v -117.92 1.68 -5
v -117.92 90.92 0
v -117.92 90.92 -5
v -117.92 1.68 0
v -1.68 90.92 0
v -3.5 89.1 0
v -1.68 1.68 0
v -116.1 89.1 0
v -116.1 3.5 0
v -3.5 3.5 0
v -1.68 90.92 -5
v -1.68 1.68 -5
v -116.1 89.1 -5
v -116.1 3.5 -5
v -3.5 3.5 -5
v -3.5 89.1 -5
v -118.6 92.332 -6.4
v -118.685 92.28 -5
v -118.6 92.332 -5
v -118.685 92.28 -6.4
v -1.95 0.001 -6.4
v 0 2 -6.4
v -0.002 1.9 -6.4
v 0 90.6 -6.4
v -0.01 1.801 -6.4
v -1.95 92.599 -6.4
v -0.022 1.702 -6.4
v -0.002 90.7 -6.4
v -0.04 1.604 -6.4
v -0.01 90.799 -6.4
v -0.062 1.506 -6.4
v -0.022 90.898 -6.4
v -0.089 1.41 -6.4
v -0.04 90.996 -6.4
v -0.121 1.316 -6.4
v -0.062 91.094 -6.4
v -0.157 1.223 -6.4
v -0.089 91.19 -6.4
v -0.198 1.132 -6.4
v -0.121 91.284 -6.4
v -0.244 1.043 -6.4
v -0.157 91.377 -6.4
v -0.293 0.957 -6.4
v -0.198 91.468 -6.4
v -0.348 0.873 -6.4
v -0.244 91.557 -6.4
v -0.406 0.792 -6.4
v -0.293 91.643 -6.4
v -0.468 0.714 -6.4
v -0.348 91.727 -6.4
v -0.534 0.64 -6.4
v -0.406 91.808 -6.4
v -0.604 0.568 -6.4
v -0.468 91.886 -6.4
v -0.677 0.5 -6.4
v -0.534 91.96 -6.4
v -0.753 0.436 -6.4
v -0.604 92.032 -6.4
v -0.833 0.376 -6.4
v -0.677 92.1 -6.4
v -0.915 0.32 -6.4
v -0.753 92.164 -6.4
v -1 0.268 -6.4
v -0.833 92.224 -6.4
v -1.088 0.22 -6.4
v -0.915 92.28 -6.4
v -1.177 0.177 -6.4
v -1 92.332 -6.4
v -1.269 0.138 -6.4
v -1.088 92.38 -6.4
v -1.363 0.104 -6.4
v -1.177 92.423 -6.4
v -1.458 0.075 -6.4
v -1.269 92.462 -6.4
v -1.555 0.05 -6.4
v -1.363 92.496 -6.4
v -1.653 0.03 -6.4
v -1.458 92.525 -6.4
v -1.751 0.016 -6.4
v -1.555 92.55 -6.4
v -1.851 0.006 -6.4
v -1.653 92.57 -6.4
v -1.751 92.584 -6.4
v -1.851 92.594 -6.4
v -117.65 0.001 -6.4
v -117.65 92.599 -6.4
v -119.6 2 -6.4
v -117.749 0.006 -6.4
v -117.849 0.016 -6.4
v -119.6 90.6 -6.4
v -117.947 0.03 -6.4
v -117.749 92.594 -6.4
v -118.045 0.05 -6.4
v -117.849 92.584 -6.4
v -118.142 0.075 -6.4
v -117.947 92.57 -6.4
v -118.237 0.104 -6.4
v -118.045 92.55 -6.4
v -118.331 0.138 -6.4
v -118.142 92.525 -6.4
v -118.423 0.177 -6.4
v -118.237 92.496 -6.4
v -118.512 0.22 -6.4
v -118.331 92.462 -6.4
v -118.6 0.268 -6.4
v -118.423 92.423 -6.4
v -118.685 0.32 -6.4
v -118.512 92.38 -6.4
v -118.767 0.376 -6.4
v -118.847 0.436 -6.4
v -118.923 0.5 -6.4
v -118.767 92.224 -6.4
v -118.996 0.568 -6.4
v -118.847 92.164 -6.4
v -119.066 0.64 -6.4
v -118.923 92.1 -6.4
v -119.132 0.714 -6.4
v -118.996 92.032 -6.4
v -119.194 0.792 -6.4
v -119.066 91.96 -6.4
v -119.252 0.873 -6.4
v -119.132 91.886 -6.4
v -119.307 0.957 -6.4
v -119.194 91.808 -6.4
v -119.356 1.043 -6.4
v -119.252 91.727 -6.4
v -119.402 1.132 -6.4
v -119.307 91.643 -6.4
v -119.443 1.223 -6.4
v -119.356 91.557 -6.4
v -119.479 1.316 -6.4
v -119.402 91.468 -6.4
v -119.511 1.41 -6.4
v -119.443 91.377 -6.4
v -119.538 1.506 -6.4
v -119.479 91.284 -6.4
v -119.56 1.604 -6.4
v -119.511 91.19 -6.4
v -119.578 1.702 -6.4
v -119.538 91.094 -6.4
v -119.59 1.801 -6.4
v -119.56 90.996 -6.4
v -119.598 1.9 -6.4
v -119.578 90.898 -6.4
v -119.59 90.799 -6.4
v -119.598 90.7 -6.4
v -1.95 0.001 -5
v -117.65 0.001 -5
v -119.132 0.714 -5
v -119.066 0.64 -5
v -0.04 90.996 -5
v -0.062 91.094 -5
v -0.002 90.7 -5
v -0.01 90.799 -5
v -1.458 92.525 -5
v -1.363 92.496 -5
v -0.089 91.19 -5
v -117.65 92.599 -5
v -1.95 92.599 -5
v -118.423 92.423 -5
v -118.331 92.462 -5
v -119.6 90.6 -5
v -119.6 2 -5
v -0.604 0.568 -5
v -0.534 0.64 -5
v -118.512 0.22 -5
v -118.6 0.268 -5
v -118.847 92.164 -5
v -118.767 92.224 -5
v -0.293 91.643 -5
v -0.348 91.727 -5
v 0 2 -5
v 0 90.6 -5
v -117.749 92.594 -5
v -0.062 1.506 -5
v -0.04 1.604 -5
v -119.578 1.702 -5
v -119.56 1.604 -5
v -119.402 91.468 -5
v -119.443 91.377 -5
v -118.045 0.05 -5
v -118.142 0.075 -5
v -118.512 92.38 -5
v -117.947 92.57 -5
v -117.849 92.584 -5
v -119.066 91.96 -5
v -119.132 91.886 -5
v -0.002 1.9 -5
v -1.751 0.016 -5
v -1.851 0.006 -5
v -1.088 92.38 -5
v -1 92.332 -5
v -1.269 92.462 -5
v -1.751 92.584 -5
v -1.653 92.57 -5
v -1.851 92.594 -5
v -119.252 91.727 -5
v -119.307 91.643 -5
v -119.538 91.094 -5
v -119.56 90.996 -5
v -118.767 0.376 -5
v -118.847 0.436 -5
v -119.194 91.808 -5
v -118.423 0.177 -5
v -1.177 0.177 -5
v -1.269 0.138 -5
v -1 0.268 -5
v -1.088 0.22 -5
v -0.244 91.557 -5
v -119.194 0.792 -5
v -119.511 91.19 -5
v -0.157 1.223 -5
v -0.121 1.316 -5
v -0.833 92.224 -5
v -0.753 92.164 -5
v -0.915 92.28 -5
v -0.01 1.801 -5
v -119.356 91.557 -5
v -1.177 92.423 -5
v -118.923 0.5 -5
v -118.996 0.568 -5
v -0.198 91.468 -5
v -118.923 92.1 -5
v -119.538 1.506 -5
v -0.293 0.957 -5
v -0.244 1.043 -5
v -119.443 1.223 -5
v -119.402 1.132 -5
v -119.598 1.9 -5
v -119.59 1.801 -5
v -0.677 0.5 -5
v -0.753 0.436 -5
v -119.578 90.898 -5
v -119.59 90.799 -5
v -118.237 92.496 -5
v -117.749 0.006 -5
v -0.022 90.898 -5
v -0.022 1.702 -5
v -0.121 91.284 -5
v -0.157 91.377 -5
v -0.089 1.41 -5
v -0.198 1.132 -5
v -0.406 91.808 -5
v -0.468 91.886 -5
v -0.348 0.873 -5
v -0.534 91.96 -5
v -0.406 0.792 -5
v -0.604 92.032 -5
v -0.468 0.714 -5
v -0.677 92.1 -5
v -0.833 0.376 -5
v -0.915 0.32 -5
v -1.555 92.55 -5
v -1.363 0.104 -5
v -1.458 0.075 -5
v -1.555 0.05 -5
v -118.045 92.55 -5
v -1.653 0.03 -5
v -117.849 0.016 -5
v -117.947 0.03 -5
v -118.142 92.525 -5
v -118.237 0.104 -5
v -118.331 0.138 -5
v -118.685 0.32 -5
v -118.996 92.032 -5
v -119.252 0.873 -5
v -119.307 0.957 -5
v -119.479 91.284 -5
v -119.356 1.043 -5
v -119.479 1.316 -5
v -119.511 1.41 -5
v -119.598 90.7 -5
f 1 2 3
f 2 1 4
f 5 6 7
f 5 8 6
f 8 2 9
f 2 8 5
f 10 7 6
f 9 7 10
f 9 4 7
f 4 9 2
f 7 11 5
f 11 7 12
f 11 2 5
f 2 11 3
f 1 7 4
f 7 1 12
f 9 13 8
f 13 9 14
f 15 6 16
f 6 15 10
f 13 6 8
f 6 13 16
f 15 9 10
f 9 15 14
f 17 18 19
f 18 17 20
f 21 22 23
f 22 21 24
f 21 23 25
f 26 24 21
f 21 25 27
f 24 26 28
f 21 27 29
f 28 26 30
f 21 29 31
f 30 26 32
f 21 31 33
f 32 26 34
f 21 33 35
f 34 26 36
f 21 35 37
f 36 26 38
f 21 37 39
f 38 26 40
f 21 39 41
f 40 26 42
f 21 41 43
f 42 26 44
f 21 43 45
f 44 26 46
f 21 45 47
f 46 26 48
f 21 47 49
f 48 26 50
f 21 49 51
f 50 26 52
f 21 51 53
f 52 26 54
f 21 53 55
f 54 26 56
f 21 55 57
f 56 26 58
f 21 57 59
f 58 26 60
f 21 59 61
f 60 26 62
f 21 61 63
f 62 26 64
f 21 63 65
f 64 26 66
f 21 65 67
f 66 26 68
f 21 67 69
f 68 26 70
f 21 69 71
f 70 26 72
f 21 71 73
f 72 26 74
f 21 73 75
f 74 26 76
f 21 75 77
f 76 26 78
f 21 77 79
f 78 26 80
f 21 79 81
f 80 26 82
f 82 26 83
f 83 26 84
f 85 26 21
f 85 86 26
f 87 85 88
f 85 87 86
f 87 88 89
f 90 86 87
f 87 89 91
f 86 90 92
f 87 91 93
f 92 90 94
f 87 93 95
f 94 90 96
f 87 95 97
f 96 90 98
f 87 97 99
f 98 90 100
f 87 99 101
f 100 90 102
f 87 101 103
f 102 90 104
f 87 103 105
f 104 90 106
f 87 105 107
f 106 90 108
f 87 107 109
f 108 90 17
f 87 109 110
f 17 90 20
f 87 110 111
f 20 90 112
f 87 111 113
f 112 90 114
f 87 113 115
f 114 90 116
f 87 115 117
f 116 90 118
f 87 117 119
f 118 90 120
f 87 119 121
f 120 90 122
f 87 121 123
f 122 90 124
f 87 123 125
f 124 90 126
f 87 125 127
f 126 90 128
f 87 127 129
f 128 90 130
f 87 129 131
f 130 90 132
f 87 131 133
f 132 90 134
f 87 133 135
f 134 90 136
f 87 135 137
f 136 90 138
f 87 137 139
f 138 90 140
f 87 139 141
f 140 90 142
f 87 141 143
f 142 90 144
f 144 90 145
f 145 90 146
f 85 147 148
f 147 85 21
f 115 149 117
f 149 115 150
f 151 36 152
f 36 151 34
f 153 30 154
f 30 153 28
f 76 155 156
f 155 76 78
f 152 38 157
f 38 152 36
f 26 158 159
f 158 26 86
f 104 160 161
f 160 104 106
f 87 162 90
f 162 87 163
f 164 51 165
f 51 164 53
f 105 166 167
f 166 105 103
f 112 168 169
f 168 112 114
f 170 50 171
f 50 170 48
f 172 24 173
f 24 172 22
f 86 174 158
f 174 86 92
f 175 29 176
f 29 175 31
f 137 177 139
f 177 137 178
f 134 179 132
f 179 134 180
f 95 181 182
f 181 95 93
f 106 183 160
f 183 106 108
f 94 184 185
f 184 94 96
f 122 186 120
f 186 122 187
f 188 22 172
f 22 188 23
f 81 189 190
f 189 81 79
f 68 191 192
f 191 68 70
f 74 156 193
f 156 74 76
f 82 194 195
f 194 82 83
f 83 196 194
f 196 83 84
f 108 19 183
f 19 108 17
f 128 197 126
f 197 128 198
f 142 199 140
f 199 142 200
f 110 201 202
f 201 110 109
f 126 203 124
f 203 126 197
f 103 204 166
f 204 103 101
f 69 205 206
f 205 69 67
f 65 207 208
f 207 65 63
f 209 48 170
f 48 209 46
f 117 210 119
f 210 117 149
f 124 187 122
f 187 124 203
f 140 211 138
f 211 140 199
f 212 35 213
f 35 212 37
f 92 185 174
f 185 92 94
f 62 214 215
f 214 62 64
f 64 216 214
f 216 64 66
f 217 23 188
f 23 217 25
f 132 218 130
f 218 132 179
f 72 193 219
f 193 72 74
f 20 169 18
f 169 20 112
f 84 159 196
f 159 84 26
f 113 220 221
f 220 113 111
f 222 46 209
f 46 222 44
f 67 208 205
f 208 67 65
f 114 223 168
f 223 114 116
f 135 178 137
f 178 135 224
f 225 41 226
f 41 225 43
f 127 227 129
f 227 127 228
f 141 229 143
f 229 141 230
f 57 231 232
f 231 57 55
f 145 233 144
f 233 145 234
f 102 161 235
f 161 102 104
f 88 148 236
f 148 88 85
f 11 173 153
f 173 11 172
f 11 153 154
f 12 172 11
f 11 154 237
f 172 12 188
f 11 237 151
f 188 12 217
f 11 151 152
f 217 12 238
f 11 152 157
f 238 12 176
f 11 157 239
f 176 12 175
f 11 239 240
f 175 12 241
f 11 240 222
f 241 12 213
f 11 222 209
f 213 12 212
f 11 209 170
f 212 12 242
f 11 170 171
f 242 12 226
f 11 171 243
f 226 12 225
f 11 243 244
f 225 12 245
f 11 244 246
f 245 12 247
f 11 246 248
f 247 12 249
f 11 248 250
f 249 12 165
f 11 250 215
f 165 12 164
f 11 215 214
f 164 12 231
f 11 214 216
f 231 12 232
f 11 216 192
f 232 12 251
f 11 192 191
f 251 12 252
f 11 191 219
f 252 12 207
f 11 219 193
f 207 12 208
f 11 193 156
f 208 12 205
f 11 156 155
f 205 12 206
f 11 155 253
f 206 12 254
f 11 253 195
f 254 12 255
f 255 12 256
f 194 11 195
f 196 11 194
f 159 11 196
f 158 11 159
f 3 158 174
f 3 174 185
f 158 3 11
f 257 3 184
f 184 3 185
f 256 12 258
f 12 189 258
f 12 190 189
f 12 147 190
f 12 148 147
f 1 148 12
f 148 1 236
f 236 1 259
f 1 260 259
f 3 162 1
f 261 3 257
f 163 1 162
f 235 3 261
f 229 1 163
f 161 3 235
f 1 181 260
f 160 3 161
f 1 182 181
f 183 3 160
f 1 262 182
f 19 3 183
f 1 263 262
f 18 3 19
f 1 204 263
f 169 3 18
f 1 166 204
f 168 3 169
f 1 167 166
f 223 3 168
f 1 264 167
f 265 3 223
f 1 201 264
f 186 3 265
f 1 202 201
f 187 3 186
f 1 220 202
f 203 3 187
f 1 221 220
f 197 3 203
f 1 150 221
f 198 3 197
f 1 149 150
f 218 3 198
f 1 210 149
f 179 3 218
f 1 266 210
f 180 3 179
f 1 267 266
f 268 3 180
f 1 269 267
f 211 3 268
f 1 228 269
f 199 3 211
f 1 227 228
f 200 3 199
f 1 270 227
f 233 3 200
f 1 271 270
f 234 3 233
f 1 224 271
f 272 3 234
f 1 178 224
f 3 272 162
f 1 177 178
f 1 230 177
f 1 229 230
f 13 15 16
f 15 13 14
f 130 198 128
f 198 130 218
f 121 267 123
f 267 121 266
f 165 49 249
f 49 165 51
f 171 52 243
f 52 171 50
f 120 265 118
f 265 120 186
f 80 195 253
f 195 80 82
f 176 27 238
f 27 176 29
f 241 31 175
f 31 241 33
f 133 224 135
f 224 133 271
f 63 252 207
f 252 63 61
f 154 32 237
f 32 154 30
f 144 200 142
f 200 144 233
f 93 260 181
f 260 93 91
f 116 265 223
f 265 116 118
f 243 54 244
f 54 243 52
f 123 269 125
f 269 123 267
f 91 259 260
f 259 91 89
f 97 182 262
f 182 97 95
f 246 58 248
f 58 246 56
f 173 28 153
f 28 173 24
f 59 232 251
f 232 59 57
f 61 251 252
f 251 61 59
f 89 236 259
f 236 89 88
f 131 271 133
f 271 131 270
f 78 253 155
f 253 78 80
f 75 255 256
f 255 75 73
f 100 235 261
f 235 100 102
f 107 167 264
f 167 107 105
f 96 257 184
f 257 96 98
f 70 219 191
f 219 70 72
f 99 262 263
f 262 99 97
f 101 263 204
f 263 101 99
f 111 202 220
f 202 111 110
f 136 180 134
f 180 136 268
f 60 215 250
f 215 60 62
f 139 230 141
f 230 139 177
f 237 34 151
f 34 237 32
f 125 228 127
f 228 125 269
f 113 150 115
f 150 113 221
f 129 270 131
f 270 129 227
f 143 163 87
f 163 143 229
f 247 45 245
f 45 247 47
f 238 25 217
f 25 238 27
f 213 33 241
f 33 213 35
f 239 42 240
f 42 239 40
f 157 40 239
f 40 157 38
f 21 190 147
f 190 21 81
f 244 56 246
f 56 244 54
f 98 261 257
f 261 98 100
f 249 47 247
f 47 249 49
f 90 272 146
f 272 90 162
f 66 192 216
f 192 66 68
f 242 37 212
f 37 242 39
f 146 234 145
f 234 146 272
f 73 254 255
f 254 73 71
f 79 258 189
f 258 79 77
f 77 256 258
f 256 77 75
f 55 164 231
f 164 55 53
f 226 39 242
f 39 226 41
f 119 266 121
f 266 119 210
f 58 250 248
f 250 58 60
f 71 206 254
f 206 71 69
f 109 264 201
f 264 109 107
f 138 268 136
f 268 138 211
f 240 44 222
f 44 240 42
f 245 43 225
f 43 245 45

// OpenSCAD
$fa = 1;
$fs = 0.1;

WIDTH = 112 +2*0.3;
HEIGHT = 85 +2*0.3;
DEPTH = 37  +0.2;

BASE_BOTTOM_WALL_DEPTH = 1.4;
LID_DEPTH = 1.4;
LID_BORDER_WIDTH=2;
LID_BORDER_DEPTH=5;

// Needs to be at "Minimum wall width" show in console output.
BASE_WALL_WIDTH = LID_BORDER_WIDTH+1.5;

module base_outside(depth=DEPTH, wall_width=BASE_WALL_WIDTH, corner_radius=2) {
	delta_xy = sin(45)*corner_radius;
	corner_xy_increase = corner_radius-delta_xy;
	echo("Minimum wall width: ", corner_xy_increase);
	missing_wall_width = wall_width-corner_xy_increase > 0 ? wall_width-corner_xy_increase : 0;

	width = WIDTH + 2*missing_wall_width;
	height = HEIGHT + 2*missing_wall_width;

	points = [[0, 0], [width, 0], [width, height], [0, height]];

	translate([corner_xy_increase, corner_xy_increase, 0])
	hull() {
		translate([points[0][0]+delta_xy, points[0][1]+delta_xy, 0])	
			cylinder(r=corner_radius, h=depth);
		translate([points[1][0]-delta_xy, points[1][1]+delta_xy, 0])	
			cylinder(r=corner_radius, h=depth);
		translate([points[2][0]-delta_xy, points[2][1]-delta_xy, 0])	
			cylinder(r=corner_radius, h=depth);
		translate([points[3][0]+delta_xy, points[3][1]-delta_xy, 0])	
			cylinder(r=corner_radius, h=depth);
	}
}

module base() {
	total_depth=BASE_BOTTOM_WALL_DEPTH+DEPTH;
	
	difference() {
		base_outside(depth=total_depth-0.2);
		
		translate([BASE_WALL_WIDTH, BASE_WALL_WIDTH, BASE_BOTTOM_WALL_DEPTH])	
			cube([WIDTH, HEIGHT, DEPTH+0.01]);
		
		lid_border_z_tolerance = 2;
		translate([BASE_WALL_WIDTH-LID_BORDER_WIDTH, BASE_WALL_WIDTH-LID_BORDER_WIDTH, total_depth-LID_BORDER_DEPTH-lid_border_z_tolerance])
			cube([WIDTH+2*LID_BORDER_WIDTH, HEIGHT+2*LID_BORDER_WIDTH, LID_BORDER_DEPTH+lid_border_z_tolerance+0.01]);
	}
}

module lid(border_tolerance=0.18) {
	translate([0, 0, LID_BORDER_DEPTH])
		base_outside(depth=LID_DEPTH);

	color("orange")
	translate([BASE_WALL_WIDTH-LID_BORDER_WIDTH, BASE_WALL_WIDTH-LID_BORDER_WIDTH])
	difference() {
		translate([border_tolerance, border_tolerance, 0])
			cube([WIDTH+2*LID_BORDER_WIDTH-2*border_tolerance, HEIGHT+2*LID_BORDER_WIDTH-2*border_tolerance, LID_BORDER_DEPTH+0.01]);
		
		translate([LID_BORDER_WIDTH, LID_BORDER_WIDTH, -0.01])
			cube([WIDTH, HEIGHT, LID_BORDER_DEPTH+0.02]);
	}
}

module button_hole(thread_diameter=6.75+2*0.3, thread_depth=5, nut_max_diameter=11.2, nut_depth=2, nut_amount_corners=6, nut_max_diameter_tolerance=0.25) {
	translate([WIDTH+BASE_WALL_WIDTH-0.01, BASE_WALL_WIDTH+HEIGHT/2, (BASE_BOTTOM_WALL_DEPTH+DEPTH+LID_DEPTH)/2]) {
		rotate([0, 90, 0])
			cylinder(d=thread_diameter, h=thread_depth);

		nut_shape_maximum_diameter = nut_max_diameter+2*nut_max_diameter_tolerance;
		nut_shape_minimum_diameter = 2*(cos((360/nut_amount_corners)/2)*(nut_max_diameter/2+nut_max_diameter_tolerance));
		echo("Nut maximum diameter:", nut_max_diameter, "; Nut shape minimum diameter:", nut_shape_minimum_diameter, "; Difference", nut_max_diameter-nut_shape_minimum_diameter);
		
		if (nut_max_diameter-nut_shape_minimum_diameter <= 2*0.4) {
			echo("WARNING! Nut max diameter tolerance is too big.");
		}
		
		translate([thread_depth-nut_depth, 0, 0])
		rotate([0, 90, 0])
			cylinder(d=nut_shape_maximum_diameter, h=nut_depth, $fn=nut_amount_corners);
	}
}

module tolerance_hole_circle(diameter=10, depth=4, tolerance_left=2, tolerance_right=2, tolerance_top=2, tolerance_bottom=2) {
	hull() {	
		translate([-tolerance_left, -tolerance_bottom, 0])
			cylinder(d=diameter, h=depth);
			
		translate([tolerance_right, -tolerance_bottom, 0])
			cylinder(d=diameter, h=depth);
		
		translate([tolerance_right, tolerance_top, 0])
			cylinder(d=diameter, h=depth);
		
		translate([-tolerance_left, tolerance_top, 0])
			cylinder(d=diameter, h=depth);
	}
}

module tolerance_hole_rectangle(width=20, height=10, depth=5, tolerance_left=0, tolerance_right=0, tolerance_top=0, tolerance_bottom=1) {
	translate([-tolerance_left-width/2, -tolerance_bottom-height/2, 0])
		cube([width+tolerance_right+tolerance_left, height+tolerance_top+tolerance_bottom, depth]);
}

module power_supply_holes(main_right_padding=25.5+5.56, main_bottom_padding=8.7, main_diameter=9.3, mcu_width=12, mcu_height=8.05, mcu_padding_main=46, mcu_padding_bottom=6.25, motor_diameter=6.5+2*0.4) {
	main_x_position = -main_right_padding-main_diameter/2;
	
	translate([WIDTH+BASE_WALL_WIDTH, BASE_WALL_WIDTH, 0]) {
		translate([main_x_position, 0.01, BASE_BOTTOM_WALL_DEPTH+main_bottom_padding+main_diameter/2])
		rotate([90, 0, 0])
			tolerance_hole_circle(diameter=main_diameter, depth=BASE_WALL_WIDTH+0.02, tolerance_left=2, tolerance_right=2, tolerance_top=2, tolerance_bottom=2);
		
		mcu_z_position = BASE_BOTTOM_WALL_DEPTH+mcu_padding_bottom+mcu_height/2;
		mcu_tolerance_top = 2;
		mcu_tolerance_right = 2;
		mcu_tolerance_left = 2;
		mcu_x_position = main_x_position-main_diameter/2-mcu_padding_main-mcu_width/2;
		translate([mcu_x_position, 0.01, mcu_z_position])
		rotate([90, 0, 0])
			tolerance_hole_rectangle(width=mcu_width, height=mcu_height, depth=BASE_WALL_WIDTH+0.02, tolerance_left=mcu_tolerance_left, tolerance_right=mcu_tolerance_right, tolerance_top=mcu_tolerance_top, tolerance_bottom=2);
		
		motor_x_position = mcu_x_position+mcu_width/2+mcu_tolerance_right-((mcu_width+mcu_tolerance_left+mcu_tolerance_right)/2);
		translate([motor_x_position, 0.01, mcu_z_position+mcu_height/2+mcu_tolerance_top+motor_diameter/2+3])
		rotate([90, 0, 0])
			cylinder(d=motor_diameter, h=BASE_WALL_WIDTH+0.02);
	}
}

module ventilation_slots(no=3, depth=BASE_WALL_WIDTH, circle_diameter=5, extra_length=3, spacing=2) {
	rotate([90, 0, 0])
	translate([-(no*circle_diameter+(no-1)*spacing), circle_diameter/2+extra_length/2, 0]) {
		for(i=[0:no-1]) {
			translate([circle_diameter/2+i*(circle_diameter+spacing), 0, 0])
				tolerance_hole_circle(diameter=circle_diameter, depth=depth, tolerance_left=0, tolerance_right=0, tolerance_top=extra_length/2, tolerance_bottom=extra_length/2);
		}
	}
}

module ventilation(padding_right=3, padding_bottom=2) {
	no = 3;
	circle_diameter = 5.5;
	extra_length = 3.5;
	spacing = 1.5;
	slots_width = no*circle_diameter+(no-1)*spacing;
	
	translate([BASE_WALL_WIDTH+WIDTH-padding_right, BASE_WALL_WIDTH+0.01, BASE_BOTTOM_WALL_DEPTH+padding_bottom])
		ventilation_slots(no=no, depth=BASE_WALL_WIDTH+0.02, circle_diameter=circle_diameter, extra_length=extra_length, spacing=spacing);
	
	translate([BASE_WALL_WIDTH+0.01, BASE_WALL_WIDTH+padding_right, BASE_BOTTOM_WALL_DEPTH+padding_bottom])
	rotate([0, 0, -90])
		ventilation_slots(no=no, depth=BASE_WALL_WIDTH+0.02, circle_diameter=circle_diameter, extra_length=extra_length, spacing=spacing);
	
	translate([BASE_WALL_WIDTH+padding_right, BASE_WALL_WIDTH+HEIGHT-0.01, BASE_BOTTOM_WALL_DEPTH+padding_bottom])
	rotate([0, 0, 180])
		ventilation_slots(no=no, depth=BASE_WALL_WIDTH+0.02, circle_diameter=circle_diameter, extra_length=extra_length, spacing=spacing);
	
	translate([BASE_WALL_WIDTH+WIDTH-0.01, BASE_WALL_WIDTH+HEIGHT-padding_right, BASE_BOTTOM_WALL_DEPTH+padding_bottom])
	rotate([0, 0, 90])
		ventilation_slots(no=no, depth=BASE_WALL_WIDTH+0.02, circle_diameter=circle_diameter, extra_length=extra_length, spacing=spacing);
}

// difference() {
// 	base();
// 	color("red")
// 		button_hole();
// 	color("orange")
// 		power_supply_holes();
// 	color("lightblue")
// 		ventilation();
// }

// translate([2*(WIDTH+2*BASE_WALL_WIDTH)+8, 0, LID_DEPTH+LID_BORDER_DEPTH])
rotate([0, 180, 0])
translate([0, 0, 0])
	lid();
